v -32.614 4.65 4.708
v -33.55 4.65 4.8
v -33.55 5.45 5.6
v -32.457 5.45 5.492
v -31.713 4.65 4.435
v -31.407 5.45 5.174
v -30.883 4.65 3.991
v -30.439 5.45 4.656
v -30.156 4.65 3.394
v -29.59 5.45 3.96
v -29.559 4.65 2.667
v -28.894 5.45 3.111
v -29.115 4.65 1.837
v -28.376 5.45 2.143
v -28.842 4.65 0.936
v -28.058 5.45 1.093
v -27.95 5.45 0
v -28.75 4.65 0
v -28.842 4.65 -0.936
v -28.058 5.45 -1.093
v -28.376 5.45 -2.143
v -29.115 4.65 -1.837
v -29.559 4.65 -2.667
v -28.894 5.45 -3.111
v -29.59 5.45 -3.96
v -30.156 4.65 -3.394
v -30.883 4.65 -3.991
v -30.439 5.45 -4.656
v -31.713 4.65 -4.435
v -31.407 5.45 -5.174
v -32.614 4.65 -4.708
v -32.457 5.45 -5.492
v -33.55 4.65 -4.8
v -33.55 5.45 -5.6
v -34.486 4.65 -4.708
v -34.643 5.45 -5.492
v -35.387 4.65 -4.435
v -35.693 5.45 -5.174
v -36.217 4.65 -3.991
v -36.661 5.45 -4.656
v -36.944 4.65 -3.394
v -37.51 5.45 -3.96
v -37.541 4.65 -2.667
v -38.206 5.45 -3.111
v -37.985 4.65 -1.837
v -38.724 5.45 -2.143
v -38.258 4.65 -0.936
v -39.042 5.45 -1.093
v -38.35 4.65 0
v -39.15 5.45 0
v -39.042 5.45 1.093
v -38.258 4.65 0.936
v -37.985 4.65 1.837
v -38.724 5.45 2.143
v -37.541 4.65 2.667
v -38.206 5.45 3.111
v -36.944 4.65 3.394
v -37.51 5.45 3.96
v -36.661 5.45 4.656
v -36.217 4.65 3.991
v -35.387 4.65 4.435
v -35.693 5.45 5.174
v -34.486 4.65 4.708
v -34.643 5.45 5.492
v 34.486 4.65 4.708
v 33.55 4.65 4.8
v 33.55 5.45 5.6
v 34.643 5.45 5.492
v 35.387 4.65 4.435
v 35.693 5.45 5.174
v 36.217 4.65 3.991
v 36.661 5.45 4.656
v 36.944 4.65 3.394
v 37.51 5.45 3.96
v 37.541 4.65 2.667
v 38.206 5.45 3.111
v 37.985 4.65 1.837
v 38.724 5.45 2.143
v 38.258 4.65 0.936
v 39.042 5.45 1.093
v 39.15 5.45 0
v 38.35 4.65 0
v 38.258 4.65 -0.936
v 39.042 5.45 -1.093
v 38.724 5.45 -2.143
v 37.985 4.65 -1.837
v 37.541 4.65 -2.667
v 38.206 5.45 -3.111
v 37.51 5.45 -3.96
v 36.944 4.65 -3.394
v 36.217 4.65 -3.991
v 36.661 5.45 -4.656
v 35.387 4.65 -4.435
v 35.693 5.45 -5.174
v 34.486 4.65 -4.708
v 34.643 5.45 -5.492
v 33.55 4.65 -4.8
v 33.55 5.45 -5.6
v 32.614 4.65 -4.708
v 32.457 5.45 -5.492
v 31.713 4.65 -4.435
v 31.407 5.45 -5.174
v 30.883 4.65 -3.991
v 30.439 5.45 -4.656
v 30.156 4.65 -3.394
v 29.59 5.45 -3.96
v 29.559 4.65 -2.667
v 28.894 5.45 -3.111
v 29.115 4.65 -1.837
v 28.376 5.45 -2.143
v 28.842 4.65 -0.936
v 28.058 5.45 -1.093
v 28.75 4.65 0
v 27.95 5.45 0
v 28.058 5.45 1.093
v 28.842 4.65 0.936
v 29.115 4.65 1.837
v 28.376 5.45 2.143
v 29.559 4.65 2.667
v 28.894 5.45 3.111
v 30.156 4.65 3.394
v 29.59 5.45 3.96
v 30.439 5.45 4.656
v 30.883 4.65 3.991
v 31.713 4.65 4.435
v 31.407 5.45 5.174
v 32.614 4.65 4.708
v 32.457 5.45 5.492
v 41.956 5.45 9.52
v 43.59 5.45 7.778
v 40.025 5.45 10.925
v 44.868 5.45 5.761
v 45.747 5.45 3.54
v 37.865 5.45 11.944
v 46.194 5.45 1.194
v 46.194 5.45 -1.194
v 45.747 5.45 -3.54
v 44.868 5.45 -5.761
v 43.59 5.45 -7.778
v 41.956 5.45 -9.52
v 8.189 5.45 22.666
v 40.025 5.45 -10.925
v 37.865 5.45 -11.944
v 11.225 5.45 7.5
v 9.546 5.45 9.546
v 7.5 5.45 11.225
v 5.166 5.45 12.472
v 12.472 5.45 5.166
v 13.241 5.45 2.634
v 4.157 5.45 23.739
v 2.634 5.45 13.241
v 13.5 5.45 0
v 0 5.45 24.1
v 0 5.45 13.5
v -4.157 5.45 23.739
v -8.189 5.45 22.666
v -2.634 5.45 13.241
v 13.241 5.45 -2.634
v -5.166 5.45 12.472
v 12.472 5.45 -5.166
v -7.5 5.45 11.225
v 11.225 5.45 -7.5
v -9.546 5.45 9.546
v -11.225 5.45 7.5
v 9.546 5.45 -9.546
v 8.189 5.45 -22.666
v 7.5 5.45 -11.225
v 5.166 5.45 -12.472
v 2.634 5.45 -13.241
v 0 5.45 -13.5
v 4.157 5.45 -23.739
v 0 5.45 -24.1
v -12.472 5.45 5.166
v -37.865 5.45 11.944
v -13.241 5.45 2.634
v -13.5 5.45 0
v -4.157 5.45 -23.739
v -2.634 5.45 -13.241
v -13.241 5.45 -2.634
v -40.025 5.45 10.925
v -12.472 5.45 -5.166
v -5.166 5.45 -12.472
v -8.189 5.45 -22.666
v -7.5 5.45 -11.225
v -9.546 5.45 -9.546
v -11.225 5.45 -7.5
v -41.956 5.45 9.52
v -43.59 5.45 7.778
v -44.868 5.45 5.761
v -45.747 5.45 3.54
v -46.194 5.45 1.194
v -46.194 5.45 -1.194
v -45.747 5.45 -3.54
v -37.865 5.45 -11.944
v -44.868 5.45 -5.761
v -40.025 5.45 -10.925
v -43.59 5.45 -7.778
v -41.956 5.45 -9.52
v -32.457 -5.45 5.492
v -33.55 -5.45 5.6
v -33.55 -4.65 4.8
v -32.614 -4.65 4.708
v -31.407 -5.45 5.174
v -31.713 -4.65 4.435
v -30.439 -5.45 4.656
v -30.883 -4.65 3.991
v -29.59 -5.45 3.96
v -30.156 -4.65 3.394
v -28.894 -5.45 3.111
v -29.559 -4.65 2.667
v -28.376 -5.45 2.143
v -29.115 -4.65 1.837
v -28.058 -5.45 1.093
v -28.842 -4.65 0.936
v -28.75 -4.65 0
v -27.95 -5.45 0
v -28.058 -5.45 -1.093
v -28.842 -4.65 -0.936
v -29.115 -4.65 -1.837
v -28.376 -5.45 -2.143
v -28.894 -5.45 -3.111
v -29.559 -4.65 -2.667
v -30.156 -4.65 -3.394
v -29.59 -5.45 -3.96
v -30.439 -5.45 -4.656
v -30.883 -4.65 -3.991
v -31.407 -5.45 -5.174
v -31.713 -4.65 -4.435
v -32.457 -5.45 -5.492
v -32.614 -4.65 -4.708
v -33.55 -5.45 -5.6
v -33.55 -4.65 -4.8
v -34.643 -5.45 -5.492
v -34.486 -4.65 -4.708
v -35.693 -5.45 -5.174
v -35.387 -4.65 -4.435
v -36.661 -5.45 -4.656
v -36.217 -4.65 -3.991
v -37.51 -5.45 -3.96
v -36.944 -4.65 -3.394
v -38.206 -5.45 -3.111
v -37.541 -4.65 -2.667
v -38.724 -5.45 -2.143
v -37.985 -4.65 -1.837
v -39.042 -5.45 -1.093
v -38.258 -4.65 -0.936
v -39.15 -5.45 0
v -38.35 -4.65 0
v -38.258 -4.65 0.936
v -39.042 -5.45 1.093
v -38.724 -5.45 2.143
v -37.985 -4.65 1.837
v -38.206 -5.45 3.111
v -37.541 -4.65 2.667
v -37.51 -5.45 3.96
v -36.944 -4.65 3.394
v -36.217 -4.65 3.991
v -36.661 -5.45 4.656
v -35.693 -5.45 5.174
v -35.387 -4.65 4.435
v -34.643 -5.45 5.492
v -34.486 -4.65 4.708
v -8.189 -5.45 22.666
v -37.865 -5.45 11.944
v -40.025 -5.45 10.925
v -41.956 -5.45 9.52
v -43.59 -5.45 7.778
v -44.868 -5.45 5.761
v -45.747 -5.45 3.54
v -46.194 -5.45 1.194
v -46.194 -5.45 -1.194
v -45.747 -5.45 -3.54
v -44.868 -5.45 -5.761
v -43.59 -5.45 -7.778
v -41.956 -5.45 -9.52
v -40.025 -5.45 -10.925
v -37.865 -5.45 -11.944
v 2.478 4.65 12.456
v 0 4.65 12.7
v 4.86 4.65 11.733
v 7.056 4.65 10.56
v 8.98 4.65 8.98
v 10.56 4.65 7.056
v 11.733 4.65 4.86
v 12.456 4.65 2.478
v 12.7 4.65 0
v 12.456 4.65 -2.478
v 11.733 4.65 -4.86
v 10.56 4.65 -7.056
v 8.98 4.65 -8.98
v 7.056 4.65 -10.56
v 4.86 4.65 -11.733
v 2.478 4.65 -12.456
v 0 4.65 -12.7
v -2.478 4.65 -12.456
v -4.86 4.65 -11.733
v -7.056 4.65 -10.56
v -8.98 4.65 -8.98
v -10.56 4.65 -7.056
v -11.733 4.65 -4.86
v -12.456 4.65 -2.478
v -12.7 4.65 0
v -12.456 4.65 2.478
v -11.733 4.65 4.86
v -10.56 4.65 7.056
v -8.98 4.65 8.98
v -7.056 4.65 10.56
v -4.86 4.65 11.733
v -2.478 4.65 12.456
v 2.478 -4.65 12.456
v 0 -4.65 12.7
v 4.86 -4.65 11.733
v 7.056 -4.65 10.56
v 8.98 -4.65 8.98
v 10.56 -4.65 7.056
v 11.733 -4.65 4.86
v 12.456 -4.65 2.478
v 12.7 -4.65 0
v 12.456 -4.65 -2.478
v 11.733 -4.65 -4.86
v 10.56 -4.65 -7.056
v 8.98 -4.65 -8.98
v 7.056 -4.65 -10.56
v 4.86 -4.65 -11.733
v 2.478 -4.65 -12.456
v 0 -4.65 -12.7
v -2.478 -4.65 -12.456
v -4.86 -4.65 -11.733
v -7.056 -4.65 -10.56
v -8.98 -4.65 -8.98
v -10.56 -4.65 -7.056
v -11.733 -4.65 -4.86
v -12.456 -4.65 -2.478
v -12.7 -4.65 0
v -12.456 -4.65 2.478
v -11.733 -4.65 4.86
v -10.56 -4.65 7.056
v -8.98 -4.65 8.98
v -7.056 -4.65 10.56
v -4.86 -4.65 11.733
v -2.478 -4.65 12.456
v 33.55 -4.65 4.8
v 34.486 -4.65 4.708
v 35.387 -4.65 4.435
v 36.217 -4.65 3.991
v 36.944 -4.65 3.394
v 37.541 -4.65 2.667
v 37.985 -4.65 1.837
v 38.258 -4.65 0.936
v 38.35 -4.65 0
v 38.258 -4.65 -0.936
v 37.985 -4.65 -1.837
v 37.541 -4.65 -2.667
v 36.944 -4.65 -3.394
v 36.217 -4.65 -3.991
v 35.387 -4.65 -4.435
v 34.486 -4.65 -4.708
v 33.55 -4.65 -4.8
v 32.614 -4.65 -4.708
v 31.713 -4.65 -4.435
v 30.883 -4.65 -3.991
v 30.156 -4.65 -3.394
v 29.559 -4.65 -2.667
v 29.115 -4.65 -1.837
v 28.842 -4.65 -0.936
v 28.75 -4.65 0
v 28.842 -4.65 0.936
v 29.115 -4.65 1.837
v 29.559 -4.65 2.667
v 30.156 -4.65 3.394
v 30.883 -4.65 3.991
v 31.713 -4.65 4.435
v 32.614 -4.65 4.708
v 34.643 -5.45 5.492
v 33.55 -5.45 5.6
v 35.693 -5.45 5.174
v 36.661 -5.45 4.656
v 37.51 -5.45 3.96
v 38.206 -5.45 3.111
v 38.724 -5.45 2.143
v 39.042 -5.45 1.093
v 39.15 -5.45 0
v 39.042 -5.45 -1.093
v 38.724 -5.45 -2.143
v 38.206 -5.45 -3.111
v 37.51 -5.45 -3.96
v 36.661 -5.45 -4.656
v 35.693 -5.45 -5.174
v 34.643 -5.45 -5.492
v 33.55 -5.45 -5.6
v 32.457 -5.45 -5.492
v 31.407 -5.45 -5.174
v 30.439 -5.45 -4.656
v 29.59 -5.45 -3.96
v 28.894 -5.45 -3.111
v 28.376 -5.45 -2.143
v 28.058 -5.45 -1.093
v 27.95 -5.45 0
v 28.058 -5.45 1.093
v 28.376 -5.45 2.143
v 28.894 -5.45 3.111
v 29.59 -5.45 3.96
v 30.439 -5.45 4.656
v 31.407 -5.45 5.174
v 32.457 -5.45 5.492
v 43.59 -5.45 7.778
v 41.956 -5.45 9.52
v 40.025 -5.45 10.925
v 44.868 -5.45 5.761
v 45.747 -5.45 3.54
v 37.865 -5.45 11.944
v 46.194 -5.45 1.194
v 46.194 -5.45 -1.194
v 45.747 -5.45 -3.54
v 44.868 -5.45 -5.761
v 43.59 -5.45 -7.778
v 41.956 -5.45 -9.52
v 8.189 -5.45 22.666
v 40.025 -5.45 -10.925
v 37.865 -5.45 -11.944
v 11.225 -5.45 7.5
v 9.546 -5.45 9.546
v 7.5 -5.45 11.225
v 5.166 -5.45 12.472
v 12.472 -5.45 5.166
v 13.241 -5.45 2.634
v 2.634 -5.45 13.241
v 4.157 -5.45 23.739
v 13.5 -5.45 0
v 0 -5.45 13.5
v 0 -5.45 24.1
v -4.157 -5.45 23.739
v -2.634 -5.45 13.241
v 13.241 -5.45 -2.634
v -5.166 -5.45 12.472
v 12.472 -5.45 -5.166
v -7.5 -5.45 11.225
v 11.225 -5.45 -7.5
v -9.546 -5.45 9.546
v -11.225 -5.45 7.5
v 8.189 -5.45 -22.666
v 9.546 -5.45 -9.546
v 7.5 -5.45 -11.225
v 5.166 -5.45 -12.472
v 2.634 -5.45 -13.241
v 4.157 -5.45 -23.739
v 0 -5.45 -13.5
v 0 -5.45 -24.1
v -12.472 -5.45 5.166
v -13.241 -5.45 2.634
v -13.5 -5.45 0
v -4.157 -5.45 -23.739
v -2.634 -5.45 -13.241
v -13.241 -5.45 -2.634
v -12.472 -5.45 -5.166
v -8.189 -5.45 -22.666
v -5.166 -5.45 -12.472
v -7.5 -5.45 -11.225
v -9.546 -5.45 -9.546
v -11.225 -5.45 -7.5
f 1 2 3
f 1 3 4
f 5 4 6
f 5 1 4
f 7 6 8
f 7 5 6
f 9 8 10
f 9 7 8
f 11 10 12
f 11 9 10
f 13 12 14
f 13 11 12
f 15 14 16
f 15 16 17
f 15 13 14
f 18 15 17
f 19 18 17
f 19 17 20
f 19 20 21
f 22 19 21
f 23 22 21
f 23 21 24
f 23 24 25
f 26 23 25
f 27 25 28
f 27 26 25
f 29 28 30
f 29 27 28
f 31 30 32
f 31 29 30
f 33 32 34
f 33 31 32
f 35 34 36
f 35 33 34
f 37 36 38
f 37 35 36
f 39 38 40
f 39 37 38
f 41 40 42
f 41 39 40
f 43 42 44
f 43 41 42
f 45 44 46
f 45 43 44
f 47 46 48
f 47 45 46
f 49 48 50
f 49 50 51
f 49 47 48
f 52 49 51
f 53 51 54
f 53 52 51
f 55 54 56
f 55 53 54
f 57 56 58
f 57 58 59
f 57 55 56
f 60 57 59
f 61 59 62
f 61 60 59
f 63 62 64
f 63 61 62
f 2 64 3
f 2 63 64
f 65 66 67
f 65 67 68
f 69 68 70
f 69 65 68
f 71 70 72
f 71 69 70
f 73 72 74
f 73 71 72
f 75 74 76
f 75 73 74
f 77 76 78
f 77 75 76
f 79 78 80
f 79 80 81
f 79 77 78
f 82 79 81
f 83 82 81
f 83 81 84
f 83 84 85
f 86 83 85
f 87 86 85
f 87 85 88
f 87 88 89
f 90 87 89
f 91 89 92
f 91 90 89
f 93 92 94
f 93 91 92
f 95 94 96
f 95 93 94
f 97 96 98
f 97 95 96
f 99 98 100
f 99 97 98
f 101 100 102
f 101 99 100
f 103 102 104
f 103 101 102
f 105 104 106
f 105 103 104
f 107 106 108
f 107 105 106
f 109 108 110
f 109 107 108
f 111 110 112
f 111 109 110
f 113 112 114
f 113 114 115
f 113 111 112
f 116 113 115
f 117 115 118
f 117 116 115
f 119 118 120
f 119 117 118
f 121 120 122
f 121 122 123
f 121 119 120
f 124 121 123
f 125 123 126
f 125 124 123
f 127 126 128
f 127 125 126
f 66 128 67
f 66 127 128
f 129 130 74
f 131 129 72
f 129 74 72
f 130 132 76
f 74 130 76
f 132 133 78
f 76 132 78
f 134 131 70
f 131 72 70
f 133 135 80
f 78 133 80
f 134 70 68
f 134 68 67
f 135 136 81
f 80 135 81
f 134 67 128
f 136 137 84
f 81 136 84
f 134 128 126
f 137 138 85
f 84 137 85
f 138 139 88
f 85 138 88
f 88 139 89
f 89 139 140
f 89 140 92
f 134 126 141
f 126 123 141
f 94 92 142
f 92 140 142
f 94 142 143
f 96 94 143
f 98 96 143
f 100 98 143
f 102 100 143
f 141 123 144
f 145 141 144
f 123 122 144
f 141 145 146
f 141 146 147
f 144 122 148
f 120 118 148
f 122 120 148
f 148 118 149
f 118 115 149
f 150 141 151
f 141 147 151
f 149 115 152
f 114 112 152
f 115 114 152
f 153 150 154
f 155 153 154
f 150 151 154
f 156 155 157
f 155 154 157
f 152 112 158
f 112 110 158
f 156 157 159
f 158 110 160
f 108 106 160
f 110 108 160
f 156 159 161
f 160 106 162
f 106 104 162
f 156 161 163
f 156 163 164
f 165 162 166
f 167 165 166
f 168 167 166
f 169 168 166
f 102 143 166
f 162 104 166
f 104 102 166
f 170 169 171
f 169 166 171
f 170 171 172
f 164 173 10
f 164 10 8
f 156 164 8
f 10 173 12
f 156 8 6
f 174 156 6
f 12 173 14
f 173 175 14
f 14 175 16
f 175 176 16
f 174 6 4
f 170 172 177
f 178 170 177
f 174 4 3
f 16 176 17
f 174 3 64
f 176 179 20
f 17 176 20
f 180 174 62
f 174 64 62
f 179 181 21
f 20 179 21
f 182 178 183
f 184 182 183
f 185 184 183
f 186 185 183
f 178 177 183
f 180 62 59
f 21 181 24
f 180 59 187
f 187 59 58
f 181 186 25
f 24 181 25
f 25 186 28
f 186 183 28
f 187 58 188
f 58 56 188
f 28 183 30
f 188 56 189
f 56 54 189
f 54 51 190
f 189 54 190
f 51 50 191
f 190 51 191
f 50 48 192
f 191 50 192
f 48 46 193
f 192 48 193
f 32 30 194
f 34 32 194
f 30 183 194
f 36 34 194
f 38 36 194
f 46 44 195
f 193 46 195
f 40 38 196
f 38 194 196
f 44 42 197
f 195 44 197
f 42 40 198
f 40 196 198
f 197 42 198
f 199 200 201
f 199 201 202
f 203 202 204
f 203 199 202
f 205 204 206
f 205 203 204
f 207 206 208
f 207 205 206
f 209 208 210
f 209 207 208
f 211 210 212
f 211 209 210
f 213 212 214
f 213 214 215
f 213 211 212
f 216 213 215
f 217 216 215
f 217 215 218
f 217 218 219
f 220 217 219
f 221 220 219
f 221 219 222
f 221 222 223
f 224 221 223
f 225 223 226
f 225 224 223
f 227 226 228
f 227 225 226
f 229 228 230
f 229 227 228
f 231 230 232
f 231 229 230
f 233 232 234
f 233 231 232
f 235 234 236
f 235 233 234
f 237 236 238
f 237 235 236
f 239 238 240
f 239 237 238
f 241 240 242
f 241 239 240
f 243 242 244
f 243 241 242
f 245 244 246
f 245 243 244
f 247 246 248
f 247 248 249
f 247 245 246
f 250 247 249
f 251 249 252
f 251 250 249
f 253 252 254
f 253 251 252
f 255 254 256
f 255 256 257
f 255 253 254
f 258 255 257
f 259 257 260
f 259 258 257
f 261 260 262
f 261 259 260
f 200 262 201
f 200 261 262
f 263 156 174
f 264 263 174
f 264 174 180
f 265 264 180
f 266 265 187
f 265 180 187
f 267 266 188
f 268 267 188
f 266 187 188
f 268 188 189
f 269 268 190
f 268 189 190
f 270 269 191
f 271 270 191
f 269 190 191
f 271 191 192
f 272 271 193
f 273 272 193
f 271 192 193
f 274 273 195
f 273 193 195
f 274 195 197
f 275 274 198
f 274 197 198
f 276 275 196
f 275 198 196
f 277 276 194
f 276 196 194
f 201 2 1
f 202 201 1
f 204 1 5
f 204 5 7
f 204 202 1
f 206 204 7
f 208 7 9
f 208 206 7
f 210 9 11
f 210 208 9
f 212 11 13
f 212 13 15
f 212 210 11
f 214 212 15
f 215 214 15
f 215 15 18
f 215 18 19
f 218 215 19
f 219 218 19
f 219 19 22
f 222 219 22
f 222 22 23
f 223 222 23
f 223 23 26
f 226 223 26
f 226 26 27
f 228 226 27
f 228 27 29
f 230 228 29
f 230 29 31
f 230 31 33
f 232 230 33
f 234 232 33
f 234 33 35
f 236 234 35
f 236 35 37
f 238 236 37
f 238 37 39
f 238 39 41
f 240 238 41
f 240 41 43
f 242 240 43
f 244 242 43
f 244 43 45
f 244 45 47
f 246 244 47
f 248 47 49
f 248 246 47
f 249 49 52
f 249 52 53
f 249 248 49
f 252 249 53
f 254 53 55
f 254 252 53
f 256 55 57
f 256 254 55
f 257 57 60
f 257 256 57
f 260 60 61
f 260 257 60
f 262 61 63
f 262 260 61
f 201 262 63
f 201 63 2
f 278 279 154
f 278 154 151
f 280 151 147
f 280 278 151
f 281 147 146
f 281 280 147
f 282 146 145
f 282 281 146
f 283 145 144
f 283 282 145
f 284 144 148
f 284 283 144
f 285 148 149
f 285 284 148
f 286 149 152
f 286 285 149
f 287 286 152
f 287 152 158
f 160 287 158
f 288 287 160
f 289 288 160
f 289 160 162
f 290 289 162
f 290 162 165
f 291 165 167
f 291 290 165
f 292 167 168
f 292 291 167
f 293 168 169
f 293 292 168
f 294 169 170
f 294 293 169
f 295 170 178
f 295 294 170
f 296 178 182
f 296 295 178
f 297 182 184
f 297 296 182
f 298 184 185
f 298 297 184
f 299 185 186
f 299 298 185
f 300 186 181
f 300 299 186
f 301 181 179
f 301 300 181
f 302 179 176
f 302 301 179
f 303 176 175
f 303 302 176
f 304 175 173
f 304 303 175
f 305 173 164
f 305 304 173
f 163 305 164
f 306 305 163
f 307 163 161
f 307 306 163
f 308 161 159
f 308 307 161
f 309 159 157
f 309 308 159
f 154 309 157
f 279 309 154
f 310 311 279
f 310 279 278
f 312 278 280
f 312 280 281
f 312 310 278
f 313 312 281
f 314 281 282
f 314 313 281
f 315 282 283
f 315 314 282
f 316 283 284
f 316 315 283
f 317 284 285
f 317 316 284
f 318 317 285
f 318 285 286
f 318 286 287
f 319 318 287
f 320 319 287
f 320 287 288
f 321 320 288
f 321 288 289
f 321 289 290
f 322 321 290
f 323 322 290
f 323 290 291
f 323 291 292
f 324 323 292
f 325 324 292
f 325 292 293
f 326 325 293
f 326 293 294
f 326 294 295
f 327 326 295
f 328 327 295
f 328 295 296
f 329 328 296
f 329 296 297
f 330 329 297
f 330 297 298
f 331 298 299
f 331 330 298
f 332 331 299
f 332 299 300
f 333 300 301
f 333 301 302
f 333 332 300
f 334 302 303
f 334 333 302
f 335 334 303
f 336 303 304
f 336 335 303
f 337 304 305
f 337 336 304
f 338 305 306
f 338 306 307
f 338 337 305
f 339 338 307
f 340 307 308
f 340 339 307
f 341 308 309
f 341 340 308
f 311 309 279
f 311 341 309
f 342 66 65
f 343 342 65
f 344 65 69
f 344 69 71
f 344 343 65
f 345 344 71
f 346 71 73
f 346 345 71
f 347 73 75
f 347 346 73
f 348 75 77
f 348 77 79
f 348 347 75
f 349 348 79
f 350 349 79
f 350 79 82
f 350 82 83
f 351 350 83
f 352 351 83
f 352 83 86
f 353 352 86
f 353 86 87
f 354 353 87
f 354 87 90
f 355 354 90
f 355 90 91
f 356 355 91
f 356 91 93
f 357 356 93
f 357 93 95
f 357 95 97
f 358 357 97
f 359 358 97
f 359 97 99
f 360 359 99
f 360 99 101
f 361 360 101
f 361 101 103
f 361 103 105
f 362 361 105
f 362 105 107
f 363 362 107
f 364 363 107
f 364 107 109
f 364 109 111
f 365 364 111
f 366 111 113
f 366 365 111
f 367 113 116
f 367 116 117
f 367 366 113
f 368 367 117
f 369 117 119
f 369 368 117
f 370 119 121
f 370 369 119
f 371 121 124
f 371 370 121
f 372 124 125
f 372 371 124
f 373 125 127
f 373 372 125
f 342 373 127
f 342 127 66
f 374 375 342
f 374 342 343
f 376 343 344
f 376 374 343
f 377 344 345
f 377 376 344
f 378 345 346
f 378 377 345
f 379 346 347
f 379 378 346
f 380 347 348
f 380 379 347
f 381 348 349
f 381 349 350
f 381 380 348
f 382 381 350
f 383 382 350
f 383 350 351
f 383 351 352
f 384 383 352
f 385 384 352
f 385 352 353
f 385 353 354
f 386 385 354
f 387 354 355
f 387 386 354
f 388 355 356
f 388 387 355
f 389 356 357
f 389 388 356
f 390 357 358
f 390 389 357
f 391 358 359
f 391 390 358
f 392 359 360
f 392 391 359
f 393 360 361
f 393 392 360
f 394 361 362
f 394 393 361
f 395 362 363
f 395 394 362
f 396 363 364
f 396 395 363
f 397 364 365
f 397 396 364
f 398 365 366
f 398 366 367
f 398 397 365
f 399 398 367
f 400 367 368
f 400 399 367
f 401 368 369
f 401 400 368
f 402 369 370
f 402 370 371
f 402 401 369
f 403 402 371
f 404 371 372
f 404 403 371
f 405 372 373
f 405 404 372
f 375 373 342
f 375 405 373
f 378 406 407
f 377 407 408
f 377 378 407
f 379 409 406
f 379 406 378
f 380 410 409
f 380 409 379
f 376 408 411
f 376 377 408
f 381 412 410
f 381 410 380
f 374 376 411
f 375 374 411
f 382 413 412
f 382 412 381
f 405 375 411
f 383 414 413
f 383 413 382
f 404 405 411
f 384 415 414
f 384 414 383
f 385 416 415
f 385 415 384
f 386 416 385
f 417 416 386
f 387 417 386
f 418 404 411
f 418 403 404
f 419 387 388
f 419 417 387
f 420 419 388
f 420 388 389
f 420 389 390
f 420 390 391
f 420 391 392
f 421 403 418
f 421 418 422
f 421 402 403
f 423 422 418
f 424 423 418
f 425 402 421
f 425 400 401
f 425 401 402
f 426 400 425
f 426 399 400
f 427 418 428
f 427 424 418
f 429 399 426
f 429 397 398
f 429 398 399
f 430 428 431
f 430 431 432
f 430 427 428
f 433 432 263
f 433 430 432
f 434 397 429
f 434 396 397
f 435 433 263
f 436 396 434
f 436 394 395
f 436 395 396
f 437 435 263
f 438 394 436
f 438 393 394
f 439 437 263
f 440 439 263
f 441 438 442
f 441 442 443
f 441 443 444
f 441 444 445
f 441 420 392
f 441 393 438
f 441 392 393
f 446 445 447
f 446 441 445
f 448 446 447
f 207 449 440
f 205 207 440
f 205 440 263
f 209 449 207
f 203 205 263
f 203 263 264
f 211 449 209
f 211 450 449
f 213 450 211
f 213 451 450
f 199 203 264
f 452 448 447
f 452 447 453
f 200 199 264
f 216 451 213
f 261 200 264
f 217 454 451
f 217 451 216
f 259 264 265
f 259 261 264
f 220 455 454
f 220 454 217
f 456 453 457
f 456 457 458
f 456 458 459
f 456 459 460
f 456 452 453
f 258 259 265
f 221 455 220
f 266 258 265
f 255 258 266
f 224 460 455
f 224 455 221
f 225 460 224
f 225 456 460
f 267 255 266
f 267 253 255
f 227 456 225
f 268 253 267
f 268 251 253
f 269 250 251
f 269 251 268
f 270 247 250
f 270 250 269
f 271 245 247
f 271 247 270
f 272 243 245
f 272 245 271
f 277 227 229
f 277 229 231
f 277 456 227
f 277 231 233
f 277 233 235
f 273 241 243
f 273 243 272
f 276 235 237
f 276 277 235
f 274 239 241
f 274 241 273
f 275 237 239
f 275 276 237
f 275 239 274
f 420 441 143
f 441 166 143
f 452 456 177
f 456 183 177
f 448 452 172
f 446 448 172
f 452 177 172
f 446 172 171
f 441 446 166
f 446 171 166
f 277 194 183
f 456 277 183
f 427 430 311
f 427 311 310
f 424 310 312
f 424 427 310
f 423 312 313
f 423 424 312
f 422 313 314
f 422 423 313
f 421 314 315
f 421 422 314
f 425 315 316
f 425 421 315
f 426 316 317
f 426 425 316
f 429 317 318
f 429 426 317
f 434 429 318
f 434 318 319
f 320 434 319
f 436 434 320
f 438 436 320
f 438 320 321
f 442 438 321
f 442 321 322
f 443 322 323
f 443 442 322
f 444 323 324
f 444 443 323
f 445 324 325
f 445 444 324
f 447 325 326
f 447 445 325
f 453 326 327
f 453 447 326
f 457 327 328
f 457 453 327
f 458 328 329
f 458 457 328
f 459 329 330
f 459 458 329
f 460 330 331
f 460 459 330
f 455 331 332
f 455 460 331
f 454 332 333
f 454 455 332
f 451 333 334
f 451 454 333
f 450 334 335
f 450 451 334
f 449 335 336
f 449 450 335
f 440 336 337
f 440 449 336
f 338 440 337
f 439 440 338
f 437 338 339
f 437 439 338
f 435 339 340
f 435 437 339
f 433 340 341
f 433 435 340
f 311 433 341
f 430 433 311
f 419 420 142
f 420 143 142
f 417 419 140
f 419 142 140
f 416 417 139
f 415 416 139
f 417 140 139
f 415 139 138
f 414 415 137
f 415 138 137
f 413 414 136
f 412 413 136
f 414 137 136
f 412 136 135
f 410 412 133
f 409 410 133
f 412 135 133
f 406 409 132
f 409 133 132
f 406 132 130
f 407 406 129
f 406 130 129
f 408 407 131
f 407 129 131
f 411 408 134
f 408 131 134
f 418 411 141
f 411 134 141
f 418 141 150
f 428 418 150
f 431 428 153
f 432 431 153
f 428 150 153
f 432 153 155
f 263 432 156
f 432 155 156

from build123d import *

# Parameters (mm, degrees)
SKETCH1_R           = 4.8
SKETCH1_R_2         = 12.7
BOSS_EXTRUDE1_DEPTH = 5.45
CHAMFER1_SIZE       = 0.8


with BuildPart() as part:
    # Sketch1 → Boss-Extrude1 (new, symmetric)
    with BuildSketch(Plane(origin=(0, 0, 0), x_dir=(1, 0, 0), z_dir=(0, 1, 0))):
        with BuildLine():
            Line((-37.865350224, 11.944360697), (-8.188971684, 22.666070298))
            ThreePointArc((-8.188971684, 22.666070298), (0, 24.1), (8.188971684, 22.666070298))
            Line((8.188971684, 22.666070298), (37.865350224, 11.944360697))
            ThreePointArc((37.865350224, 11.944360697), (46.25, 0), (37.865350224, -11.944360697))
            Line((37.865350224, -11.944360697), (8.188971684, -22.666070298))
            ThreePointArc((8.188971684, -22.666070298), (0, -24.1), (-8.188971684, -22.666070298))
            Line((-8.188971684, -22.666070298), (-37.865350224, -11.944360697))
            ThreePointArc((-37.865350224, -11.944360697), (-46.25, 0), (-37.865350224, 11.944360697))
        make_face()
        with Locations(Location((-33.55, 0, 0), (0, 0, 270))):
            Circle(SKETCH1_R, mode=Mode.SUBTRACT)
        with Locations(Location((33.55, 0, 0), (0, 0, 270))):
            Circle(SKETCH1_R, mode=Mode.SUBTRACT)
        with Locations(Location((0, 0, 0), (0, 0, 270))):
            Circle(SKETCH1_R_2, mode=Mode.SUBTRACT)
    extrude(amount=BOSS_EXTRUDE1_DEPTH, both=True)

    # Chamfer1
    chamfer1_edges = [part.edges().sort_by_distance(p)[0] for p in [
        (-33.55, -5.45, -4.8),
        (-33.55, 5.45, -4.8),
        (33.55, -5.45, -4.8),
        (33.55, 5.45, -4.8),
        (0, -5.45, -12.7),
        (0, 5.45, -12.7),
    ]]
    chamfer(chamfer1_edges, length=CHAMFER1_SIZE)


solid = part.part
